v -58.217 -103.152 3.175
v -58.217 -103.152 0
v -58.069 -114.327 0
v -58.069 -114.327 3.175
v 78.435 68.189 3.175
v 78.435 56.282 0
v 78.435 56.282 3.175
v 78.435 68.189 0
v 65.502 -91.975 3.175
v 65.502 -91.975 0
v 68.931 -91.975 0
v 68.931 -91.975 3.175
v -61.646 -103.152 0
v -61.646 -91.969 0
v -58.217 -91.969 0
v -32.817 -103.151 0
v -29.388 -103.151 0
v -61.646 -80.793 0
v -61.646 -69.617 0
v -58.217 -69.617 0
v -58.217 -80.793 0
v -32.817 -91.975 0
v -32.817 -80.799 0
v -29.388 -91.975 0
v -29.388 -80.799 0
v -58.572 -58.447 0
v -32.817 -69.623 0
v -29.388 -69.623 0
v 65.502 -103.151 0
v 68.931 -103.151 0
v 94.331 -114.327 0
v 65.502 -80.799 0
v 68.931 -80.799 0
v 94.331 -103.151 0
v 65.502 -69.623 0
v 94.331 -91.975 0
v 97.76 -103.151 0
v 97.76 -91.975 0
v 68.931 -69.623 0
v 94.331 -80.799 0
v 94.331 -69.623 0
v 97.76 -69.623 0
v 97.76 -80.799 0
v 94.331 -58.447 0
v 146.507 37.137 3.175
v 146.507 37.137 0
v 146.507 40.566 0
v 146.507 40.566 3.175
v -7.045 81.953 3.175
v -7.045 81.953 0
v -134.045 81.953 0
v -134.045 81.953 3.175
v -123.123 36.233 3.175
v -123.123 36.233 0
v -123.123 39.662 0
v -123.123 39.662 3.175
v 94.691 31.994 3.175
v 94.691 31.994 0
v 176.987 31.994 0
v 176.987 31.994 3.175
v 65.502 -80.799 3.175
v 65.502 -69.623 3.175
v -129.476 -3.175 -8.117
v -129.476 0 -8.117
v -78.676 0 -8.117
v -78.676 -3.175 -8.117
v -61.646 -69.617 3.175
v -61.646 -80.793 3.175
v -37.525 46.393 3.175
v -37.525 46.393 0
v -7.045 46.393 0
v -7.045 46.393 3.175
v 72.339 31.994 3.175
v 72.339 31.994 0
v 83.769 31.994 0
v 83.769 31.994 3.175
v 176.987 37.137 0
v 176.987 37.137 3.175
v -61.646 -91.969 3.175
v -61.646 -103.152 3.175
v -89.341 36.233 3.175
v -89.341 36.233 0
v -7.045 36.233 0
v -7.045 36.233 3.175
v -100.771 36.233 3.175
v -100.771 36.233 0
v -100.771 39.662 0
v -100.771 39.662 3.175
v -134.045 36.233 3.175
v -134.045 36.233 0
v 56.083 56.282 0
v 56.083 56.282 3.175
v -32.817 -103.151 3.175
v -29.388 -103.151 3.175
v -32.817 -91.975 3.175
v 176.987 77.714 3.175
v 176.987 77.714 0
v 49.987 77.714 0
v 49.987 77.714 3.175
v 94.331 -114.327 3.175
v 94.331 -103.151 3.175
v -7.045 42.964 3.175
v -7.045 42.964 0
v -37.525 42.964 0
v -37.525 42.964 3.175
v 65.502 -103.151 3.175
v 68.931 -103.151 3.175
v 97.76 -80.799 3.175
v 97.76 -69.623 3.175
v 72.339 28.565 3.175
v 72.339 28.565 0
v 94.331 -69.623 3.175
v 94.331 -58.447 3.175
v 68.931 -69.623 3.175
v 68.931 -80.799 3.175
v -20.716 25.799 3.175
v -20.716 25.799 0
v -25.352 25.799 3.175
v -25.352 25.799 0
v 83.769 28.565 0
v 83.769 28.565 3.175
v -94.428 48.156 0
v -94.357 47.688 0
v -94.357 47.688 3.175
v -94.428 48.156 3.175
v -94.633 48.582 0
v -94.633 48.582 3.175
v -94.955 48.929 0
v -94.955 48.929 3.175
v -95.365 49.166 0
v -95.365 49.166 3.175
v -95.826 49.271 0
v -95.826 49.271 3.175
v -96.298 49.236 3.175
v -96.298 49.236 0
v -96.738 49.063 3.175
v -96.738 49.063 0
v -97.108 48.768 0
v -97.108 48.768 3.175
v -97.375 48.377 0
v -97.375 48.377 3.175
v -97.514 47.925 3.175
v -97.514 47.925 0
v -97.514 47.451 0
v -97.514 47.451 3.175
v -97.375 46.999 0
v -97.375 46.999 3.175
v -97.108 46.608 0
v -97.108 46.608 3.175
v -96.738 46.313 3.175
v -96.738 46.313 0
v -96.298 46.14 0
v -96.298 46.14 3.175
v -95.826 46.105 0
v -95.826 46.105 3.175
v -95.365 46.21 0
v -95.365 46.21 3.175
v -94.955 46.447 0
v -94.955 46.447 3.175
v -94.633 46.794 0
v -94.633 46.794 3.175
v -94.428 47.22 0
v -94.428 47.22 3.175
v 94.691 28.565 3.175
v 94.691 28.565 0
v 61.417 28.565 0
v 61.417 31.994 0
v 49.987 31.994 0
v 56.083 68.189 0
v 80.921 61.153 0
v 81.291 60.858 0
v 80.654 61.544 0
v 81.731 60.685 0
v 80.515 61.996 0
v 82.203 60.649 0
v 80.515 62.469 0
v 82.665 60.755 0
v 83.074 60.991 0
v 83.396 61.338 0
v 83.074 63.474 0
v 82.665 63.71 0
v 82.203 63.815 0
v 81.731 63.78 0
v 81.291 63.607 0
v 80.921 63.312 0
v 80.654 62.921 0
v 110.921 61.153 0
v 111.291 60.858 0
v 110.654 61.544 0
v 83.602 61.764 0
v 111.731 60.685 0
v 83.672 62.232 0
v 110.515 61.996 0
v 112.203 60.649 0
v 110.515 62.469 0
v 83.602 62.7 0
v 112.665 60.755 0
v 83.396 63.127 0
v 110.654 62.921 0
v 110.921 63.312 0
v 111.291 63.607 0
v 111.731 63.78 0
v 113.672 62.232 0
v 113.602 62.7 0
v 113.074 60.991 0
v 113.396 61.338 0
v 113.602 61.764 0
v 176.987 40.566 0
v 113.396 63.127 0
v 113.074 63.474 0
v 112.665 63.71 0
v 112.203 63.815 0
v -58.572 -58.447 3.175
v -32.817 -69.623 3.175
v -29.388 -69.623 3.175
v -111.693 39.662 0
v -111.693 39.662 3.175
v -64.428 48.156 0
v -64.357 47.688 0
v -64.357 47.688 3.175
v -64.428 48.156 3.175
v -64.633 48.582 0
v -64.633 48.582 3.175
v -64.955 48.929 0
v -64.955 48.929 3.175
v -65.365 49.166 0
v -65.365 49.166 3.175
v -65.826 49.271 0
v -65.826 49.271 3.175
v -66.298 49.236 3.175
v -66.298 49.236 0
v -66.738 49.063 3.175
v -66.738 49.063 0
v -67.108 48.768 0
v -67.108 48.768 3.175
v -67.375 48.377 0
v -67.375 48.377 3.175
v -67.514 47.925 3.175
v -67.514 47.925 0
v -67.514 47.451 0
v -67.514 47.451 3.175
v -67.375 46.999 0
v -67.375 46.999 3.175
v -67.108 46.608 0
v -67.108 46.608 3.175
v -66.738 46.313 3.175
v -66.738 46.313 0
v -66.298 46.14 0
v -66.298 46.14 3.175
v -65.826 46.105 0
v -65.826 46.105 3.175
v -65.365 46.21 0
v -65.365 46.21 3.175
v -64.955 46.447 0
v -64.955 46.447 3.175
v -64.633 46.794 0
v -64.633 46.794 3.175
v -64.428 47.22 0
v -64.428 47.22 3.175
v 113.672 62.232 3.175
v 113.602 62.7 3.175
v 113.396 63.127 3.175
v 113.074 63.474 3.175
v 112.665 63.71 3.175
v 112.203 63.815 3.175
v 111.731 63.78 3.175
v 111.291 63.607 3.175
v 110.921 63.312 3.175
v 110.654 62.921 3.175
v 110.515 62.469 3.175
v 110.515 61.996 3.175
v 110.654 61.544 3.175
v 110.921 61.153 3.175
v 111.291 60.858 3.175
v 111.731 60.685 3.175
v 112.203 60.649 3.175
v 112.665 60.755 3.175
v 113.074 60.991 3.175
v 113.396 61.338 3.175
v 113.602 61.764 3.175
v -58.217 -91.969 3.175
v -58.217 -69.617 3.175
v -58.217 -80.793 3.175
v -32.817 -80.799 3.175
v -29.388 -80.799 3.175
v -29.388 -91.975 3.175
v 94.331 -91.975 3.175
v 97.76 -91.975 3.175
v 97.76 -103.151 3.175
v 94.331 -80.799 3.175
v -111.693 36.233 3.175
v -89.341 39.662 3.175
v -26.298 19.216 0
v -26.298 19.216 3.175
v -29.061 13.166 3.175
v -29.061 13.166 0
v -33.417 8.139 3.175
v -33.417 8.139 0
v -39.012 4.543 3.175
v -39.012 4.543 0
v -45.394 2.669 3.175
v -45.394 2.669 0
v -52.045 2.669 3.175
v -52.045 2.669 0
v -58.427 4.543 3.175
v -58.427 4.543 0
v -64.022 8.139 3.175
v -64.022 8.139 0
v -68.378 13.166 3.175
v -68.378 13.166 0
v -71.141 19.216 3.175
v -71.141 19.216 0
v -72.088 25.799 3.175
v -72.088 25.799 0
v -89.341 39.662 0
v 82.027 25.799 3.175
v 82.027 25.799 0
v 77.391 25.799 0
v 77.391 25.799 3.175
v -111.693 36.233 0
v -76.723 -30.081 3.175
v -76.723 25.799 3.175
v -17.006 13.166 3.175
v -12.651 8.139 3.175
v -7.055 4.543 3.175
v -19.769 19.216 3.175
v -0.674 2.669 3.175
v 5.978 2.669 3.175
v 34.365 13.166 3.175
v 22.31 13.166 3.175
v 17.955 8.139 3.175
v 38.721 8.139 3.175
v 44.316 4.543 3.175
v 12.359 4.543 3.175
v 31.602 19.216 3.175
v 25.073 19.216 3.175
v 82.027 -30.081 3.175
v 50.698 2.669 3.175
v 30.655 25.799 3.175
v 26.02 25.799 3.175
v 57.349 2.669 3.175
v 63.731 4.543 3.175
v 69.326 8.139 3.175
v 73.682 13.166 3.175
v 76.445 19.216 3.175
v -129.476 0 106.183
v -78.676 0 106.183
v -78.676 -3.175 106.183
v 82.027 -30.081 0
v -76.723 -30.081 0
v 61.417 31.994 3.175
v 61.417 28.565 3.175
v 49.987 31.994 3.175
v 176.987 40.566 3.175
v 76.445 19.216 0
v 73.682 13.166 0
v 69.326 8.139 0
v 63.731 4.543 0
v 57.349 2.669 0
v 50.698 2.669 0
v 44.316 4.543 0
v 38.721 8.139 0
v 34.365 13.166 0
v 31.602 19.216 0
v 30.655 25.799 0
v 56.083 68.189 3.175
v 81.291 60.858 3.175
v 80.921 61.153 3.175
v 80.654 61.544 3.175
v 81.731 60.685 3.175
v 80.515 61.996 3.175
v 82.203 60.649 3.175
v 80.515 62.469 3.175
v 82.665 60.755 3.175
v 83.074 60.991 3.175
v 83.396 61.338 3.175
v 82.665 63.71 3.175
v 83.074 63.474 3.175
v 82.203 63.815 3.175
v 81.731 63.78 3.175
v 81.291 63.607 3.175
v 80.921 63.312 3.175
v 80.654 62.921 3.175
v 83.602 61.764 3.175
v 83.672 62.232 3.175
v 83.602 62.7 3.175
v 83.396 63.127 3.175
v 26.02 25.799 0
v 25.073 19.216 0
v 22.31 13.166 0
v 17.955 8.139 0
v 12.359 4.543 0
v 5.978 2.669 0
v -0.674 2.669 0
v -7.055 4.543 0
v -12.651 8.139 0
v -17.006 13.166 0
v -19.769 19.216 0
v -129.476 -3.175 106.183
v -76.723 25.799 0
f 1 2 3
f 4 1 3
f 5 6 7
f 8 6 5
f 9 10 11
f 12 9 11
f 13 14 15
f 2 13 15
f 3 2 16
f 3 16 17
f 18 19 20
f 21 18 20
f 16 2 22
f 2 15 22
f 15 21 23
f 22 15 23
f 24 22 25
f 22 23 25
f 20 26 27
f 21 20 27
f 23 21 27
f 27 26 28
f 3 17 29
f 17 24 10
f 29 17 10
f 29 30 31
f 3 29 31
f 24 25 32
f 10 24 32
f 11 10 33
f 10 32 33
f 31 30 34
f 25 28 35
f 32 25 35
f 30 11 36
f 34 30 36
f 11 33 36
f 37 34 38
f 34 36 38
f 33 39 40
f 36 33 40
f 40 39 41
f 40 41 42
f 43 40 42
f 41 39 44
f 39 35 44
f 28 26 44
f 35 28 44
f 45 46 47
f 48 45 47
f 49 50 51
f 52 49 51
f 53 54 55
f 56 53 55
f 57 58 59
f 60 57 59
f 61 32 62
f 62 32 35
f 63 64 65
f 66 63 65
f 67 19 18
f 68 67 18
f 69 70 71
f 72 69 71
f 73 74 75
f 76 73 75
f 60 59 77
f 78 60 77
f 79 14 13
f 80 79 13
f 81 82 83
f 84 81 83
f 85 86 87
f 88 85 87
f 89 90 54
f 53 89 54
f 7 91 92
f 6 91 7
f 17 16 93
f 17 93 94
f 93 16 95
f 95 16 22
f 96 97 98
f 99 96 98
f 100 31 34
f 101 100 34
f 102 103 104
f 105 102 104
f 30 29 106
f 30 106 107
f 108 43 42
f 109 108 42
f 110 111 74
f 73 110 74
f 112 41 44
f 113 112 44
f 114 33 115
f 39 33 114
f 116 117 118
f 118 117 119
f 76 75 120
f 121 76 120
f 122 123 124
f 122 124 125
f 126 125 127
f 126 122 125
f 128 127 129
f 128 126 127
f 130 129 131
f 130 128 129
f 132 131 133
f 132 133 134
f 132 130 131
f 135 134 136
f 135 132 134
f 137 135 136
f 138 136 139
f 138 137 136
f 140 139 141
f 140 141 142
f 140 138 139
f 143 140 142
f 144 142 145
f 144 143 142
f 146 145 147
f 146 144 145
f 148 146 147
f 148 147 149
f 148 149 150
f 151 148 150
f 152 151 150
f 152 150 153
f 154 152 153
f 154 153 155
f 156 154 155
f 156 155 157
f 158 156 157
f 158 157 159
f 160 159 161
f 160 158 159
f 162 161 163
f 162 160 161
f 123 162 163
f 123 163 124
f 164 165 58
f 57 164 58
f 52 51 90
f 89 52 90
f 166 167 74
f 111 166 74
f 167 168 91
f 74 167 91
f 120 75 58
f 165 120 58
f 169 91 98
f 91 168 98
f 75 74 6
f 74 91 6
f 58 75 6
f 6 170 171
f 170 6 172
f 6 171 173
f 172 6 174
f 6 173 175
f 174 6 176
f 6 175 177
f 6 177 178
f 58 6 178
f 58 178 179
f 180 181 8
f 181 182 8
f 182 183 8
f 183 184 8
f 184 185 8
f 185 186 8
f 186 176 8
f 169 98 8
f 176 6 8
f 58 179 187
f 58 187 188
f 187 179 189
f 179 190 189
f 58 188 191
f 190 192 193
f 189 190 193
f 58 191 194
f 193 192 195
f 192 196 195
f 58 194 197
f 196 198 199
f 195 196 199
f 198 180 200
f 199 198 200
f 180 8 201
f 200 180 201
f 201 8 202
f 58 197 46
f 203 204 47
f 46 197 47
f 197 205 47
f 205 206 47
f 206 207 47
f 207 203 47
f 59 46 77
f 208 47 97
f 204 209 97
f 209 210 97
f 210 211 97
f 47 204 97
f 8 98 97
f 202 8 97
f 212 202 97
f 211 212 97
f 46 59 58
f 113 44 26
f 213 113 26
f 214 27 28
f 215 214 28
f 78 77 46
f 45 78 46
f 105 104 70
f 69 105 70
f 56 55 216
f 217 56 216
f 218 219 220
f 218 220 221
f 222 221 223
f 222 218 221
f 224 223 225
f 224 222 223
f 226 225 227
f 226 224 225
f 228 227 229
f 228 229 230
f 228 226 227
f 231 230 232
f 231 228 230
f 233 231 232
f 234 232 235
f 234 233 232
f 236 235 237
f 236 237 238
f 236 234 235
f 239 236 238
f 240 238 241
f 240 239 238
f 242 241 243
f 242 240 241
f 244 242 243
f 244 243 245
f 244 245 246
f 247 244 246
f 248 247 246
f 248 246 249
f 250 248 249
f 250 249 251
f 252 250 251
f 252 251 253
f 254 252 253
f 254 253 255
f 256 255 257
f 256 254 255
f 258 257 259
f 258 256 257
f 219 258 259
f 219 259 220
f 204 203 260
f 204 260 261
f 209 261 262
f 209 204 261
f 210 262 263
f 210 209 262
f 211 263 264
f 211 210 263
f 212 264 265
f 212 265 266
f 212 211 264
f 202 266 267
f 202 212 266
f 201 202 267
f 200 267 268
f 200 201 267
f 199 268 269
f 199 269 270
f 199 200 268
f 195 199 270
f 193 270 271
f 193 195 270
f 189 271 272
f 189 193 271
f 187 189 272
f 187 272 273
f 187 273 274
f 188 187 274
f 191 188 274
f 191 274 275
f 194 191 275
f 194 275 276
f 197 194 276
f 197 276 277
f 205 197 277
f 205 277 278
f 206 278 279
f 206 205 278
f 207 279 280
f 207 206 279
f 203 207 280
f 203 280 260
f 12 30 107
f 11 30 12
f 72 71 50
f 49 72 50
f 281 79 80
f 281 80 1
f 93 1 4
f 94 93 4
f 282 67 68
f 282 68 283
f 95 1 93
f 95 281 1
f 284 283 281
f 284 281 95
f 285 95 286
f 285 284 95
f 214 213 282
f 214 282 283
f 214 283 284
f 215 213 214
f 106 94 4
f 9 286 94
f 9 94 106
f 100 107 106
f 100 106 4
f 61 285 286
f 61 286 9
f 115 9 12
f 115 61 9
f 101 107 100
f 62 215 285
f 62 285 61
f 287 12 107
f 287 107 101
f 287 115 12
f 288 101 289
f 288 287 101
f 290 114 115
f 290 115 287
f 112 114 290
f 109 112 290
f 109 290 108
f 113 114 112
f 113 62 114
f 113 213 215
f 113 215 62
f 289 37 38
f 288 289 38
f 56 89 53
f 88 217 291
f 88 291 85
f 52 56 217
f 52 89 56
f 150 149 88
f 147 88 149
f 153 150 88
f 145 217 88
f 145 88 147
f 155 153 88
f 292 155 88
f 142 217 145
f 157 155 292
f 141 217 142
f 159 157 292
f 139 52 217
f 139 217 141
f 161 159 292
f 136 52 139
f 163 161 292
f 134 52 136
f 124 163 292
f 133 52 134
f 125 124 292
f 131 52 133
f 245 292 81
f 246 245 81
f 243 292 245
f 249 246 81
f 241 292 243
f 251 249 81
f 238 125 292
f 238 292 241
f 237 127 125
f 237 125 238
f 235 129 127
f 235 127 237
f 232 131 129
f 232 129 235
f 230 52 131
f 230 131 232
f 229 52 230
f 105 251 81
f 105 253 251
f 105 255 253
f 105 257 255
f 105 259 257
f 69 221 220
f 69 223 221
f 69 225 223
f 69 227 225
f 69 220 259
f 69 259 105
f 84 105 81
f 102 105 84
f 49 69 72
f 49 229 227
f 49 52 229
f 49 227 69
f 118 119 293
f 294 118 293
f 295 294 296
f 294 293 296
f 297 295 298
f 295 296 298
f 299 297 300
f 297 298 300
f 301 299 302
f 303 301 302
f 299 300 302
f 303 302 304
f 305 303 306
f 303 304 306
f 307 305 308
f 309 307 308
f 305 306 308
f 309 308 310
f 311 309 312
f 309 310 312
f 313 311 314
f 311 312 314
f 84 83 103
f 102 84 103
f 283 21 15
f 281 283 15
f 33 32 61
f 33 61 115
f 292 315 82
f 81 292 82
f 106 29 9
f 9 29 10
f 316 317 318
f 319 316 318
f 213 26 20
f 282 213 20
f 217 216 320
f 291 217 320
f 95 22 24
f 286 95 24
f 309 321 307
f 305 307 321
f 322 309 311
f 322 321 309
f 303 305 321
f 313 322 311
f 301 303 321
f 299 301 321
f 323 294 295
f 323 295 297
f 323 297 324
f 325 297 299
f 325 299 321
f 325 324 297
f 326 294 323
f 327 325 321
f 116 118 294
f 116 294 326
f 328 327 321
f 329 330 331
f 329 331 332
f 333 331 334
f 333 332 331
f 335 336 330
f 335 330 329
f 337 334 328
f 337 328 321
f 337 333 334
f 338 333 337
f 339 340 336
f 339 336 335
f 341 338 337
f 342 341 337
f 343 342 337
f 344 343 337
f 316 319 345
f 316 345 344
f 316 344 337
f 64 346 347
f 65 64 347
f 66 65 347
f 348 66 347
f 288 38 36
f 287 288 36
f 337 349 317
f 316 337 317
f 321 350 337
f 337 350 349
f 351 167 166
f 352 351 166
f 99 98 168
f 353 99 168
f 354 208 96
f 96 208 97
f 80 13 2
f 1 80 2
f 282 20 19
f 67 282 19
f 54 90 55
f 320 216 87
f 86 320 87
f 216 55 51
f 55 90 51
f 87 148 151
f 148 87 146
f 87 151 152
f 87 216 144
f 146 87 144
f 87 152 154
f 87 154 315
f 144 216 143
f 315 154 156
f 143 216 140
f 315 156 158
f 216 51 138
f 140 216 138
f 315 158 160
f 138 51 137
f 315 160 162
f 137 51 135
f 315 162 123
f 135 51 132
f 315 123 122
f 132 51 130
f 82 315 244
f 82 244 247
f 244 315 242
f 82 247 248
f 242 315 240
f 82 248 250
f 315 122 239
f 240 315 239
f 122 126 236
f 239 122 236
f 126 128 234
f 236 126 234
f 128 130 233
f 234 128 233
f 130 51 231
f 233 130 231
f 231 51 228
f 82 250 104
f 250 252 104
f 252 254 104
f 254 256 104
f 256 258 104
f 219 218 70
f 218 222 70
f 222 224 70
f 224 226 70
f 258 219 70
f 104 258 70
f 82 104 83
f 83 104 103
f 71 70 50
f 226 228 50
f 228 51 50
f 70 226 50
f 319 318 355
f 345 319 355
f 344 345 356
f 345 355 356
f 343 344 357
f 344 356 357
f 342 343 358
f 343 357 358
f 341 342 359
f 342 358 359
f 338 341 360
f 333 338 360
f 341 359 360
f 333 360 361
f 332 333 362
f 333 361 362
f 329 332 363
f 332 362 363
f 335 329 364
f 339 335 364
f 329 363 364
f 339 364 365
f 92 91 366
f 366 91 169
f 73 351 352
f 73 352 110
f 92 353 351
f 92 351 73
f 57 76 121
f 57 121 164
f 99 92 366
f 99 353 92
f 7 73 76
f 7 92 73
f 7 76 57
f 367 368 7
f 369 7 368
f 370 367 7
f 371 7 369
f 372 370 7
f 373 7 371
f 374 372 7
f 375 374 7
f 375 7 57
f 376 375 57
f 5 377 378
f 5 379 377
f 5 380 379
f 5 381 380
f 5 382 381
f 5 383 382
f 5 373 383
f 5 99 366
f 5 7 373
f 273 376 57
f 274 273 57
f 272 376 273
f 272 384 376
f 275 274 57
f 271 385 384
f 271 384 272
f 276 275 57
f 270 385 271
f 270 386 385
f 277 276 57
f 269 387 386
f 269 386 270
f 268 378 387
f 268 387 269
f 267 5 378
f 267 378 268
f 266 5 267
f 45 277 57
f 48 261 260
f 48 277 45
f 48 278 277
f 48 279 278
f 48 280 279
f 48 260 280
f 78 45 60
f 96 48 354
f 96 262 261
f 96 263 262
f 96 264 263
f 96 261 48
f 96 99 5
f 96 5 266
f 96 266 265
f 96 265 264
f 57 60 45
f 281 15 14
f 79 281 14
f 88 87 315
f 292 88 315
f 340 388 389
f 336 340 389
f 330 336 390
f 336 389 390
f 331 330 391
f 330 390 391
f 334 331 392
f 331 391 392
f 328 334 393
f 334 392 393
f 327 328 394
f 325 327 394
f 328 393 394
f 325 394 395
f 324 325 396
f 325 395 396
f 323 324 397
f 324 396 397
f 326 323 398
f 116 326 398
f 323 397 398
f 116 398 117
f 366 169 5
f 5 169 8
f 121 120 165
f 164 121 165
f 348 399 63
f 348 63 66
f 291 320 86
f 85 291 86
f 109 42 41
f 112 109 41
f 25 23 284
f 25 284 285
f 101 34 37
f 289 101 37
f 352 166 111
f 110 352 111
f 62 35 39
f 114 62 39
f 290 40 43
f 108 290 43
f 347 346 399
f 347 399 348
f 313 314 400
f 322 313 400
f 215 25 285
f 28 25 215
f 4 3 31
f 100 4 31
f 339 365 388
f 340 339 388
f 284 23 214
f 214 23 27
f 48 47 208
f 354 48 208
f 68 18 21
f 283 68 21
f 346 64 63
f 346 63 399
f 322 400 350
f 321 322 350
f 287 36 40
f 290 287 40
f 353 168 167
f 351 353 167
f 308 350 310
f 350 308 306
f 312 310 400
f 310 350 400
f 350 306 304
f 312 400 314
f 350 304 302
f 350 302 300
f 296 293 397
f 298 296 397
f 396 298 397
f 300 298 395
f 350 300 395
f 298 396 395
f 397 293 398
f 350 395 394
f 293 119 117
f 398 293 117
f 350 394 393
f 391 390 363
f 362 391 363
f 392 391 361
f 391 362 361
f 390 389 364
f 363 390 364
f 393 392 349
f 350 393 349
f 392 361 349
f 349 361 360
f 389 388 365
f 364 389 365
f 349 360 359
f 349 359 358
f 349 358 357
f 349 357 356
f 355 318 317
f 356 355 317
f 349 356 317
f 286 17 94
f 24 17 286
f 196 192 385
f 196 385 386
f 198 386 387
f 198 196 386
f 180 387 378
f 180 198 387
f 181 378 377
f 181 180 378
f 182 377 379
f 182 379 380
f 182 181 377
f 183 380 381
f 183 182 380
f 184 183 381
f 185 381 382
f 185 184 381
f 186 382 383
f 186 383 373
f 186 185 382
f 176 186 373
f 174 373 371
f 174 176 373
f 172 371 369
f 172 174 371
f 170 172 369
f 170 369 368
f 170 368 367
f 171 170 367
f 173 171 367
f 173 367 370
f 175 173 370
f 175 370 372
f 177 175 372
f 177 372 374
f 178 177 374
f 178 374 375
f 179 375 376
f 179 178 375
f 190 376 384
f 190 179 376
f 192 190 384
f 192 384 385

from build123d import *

# Parameters (mm, degrees)
F1_DEPTH = 3.175
F2_R     = 1.5875
F3_DEPTH = 3.175
F4_W     = 3.429
F4_H     = 11.176
F5_DEPTH = 3.175
F6_W     = 22.352
F6_H     = 11.90625
F6_R     = 1.5875
F7_DEPTH = 3.175
F8_W     = 50.8
F8_H     = 114.3
F9_DEPTH = 3.175


# Not quite as in the source:
# - a length typed as a fraction of an inch, garbled in the dataset ("3 / 203.2 mm" for 3/8 in), is restored


with BuildPart() as f1:
    # F0 (on Top) → F1 (new body)
    with BuildSketch(Plane.XY):
        with BuildLine():
            Line((-72.0875338231, 25.7993119954), (-76.7230338231, 25.7993119954))
            Line((-76.7230338231, 25.7993119954), (-76.7230338231, -30.0806880046))
            Line((-76.7230338231, -30.0806880046), (82.0269661769, -30.0806880046))
            Line((82.0269661769, -30.0806880046), (82.0269661769, 25.7993119954))
            Line((82.0269661769, 25.7993119954), (77.3914661769, 25.7993119954))
            ThreePointArc((77.3914661769, 25.7993119954), (54.0234661769, 2.4313119954), (30.6554661769, 25.7993119954))
            Line((30.6554661769, 25.7993119954), (26.0199661769, 25.7993119954))
            ThreePointArc((26.0199661769, 25.7993119954), (2.6519661769, 2.4313119954), (-20.7160338231, 25.7993119954))
            Line((-20.7160338231, 25.7993119954), (-25.3515338231, 25.7993119954))
            ThreePointArc((-25.3515338231, 25.7993119954), (-48.7195338231, 2.4313119954), (-72.0875338231, 25.7993119954))
        make_face()
    extrude(amount=F1_DEPTH)


with BuildPart() as f3:
    # F2 (on Top) → F3 (new body)
    with BuildSketch(Plane.XY):
        Polygon((-7.0445054214, 81.9526092303), (-134.0445054214, 81.9526092303), (-134.0445054214, 36.2326092303), (-123.1225054214, 36.2326092303), (-123.1225054214, 39.6616092303), (-111.6925054214, 39.6616092303), (-111.6925054214, 36.2326092303), (-100.7705054214, 36.2326092303), (-100.7705054214, 39.6616092303), (-89.3405054214, 39.6616092303), (-89.3405054214, 36.2326092303), (-78.4185054214, 36.2326092303), (-66.9885054214, 36.2326092303), (-7.0445054214, 36.2326092303), (-7.0445054214, 42.9636092303), (-37.5245054214, 42.9636092303), (-37.5245054214, 46.3926092303), (-7.0445054214, 46.3926092303), align=None)
        with Locations((-95.9445054214, 47.6880092303)):
            Circle(F2_R, mode=Mode.SUBTRACT)
        with Locations((-65.9445054214, 47.6880092303)):
            Circle(F2_R, mode=Mode.SUBTRACT)
    extrude(amount=F3_DEPTH)


with BuildPart() as f5:
    # F4 (on Top) → F5 (new body)
    with BuildSketch(Plane.XY):
        Polygon((94.330517361, -58.446758062), (-58.5715263949, -58.446758062), (-58.2169860113, -69.6171330385), (-61.6459860113, -69.6171330385), (-61.6459860113, -80.7931330385), (-58.2169860113, -80.7931330385), (-58.2169860113, -91.9691330385), (-61.6459860113, -91.9691330385), (-61.6459860113, -103.1517314958), (-58.2169860113, -103.1517314958), (-58.069482639, -114.326758062), (94.330517361, -114.326758062), (94.330517361, -103.150758062), (97.759517361, -103.150758062), (97.759517361, -91.974758062), (94.330517361, -91.974758062), (94.330517361, -80.798758062), (97.759517361, -80.798758062), (97.759517361, -69.622758062), (94.330517361, -69.622758062), align=None)
        with Locations((-31.1024860113, -97.562758062)):
            Rectangle(F4_W, F4_H, mode=Mode.SUBTRACT)
        with Locations((67.216017361, -97.562758062)):
            Rectangle(F4_W, F4_H, mode=Mode.SUBTRACT)
        with Locations((-31.1024860113, -75.210758062)):
            Rectangle(F4_W, F4_H, mode=Mode.SUBTRACT)
        with Locations((67.216017361, -75.210758062)):
            Rectangle(F4_W, F4_H, mode=Mode.SUBTRACT)
    extrude(amount=F5_DEPTH)


with BuildPart() as f7:
    # F6 (on Top) → F7 (new body)
    with BuildSketch(Plane.XY):
        Polygon((176.9865440756, 77.7137125557), (49.9865440756, 77.7137125557), (49.9865440756, 31.9937125557), (61.4165440756, 31.9937125557), (61.4165440756, 28.5647125557), (72.3385440756, 28.5647125557), (72.3385440756, 31.9937125557), (83.7685440756, 31.9937125557), (83.7685440756, 28.5647125557), (94.6905440756, 28.5647125557), (94.6905440756, 31.9937125557), (176.9865440756, 31.9937125557), (176.9865440756, 37.1372125557), (146.5065440756, 37.1372125557), (146.5065440756, 40.5662125557), (176.9865440756, 40.5662125557), align=None)
        with Locations((67.2585440756, 62.2355875557)):
            Rectangle(F6_W, F6_H, mode=Mode.SUBTRACT)
        with Locations((82.0845440756, 62.2324125557)):
            Circle(F6_R, mode=Mode.SUBTRACT)
        with Locations((112.0845440756, 62.2324125557)):
            Circle(F6_R, mode=Mode.SUBTRACT)
    extrude(amount=F7_DEPTH)


with BuildPart() as f9:
    # F8 (on Front) → F9 (new body)
    with BuildSketch(Plane.XZ):
        with Locations((-104.0762934036, 49.0330420434)):
            Rectangle(F8_W, F8_H)
    extrude(amount=F9_DEPTH)


solid = Compound([f1.part, f3.part, f5.part, f7.part, f9.part])
